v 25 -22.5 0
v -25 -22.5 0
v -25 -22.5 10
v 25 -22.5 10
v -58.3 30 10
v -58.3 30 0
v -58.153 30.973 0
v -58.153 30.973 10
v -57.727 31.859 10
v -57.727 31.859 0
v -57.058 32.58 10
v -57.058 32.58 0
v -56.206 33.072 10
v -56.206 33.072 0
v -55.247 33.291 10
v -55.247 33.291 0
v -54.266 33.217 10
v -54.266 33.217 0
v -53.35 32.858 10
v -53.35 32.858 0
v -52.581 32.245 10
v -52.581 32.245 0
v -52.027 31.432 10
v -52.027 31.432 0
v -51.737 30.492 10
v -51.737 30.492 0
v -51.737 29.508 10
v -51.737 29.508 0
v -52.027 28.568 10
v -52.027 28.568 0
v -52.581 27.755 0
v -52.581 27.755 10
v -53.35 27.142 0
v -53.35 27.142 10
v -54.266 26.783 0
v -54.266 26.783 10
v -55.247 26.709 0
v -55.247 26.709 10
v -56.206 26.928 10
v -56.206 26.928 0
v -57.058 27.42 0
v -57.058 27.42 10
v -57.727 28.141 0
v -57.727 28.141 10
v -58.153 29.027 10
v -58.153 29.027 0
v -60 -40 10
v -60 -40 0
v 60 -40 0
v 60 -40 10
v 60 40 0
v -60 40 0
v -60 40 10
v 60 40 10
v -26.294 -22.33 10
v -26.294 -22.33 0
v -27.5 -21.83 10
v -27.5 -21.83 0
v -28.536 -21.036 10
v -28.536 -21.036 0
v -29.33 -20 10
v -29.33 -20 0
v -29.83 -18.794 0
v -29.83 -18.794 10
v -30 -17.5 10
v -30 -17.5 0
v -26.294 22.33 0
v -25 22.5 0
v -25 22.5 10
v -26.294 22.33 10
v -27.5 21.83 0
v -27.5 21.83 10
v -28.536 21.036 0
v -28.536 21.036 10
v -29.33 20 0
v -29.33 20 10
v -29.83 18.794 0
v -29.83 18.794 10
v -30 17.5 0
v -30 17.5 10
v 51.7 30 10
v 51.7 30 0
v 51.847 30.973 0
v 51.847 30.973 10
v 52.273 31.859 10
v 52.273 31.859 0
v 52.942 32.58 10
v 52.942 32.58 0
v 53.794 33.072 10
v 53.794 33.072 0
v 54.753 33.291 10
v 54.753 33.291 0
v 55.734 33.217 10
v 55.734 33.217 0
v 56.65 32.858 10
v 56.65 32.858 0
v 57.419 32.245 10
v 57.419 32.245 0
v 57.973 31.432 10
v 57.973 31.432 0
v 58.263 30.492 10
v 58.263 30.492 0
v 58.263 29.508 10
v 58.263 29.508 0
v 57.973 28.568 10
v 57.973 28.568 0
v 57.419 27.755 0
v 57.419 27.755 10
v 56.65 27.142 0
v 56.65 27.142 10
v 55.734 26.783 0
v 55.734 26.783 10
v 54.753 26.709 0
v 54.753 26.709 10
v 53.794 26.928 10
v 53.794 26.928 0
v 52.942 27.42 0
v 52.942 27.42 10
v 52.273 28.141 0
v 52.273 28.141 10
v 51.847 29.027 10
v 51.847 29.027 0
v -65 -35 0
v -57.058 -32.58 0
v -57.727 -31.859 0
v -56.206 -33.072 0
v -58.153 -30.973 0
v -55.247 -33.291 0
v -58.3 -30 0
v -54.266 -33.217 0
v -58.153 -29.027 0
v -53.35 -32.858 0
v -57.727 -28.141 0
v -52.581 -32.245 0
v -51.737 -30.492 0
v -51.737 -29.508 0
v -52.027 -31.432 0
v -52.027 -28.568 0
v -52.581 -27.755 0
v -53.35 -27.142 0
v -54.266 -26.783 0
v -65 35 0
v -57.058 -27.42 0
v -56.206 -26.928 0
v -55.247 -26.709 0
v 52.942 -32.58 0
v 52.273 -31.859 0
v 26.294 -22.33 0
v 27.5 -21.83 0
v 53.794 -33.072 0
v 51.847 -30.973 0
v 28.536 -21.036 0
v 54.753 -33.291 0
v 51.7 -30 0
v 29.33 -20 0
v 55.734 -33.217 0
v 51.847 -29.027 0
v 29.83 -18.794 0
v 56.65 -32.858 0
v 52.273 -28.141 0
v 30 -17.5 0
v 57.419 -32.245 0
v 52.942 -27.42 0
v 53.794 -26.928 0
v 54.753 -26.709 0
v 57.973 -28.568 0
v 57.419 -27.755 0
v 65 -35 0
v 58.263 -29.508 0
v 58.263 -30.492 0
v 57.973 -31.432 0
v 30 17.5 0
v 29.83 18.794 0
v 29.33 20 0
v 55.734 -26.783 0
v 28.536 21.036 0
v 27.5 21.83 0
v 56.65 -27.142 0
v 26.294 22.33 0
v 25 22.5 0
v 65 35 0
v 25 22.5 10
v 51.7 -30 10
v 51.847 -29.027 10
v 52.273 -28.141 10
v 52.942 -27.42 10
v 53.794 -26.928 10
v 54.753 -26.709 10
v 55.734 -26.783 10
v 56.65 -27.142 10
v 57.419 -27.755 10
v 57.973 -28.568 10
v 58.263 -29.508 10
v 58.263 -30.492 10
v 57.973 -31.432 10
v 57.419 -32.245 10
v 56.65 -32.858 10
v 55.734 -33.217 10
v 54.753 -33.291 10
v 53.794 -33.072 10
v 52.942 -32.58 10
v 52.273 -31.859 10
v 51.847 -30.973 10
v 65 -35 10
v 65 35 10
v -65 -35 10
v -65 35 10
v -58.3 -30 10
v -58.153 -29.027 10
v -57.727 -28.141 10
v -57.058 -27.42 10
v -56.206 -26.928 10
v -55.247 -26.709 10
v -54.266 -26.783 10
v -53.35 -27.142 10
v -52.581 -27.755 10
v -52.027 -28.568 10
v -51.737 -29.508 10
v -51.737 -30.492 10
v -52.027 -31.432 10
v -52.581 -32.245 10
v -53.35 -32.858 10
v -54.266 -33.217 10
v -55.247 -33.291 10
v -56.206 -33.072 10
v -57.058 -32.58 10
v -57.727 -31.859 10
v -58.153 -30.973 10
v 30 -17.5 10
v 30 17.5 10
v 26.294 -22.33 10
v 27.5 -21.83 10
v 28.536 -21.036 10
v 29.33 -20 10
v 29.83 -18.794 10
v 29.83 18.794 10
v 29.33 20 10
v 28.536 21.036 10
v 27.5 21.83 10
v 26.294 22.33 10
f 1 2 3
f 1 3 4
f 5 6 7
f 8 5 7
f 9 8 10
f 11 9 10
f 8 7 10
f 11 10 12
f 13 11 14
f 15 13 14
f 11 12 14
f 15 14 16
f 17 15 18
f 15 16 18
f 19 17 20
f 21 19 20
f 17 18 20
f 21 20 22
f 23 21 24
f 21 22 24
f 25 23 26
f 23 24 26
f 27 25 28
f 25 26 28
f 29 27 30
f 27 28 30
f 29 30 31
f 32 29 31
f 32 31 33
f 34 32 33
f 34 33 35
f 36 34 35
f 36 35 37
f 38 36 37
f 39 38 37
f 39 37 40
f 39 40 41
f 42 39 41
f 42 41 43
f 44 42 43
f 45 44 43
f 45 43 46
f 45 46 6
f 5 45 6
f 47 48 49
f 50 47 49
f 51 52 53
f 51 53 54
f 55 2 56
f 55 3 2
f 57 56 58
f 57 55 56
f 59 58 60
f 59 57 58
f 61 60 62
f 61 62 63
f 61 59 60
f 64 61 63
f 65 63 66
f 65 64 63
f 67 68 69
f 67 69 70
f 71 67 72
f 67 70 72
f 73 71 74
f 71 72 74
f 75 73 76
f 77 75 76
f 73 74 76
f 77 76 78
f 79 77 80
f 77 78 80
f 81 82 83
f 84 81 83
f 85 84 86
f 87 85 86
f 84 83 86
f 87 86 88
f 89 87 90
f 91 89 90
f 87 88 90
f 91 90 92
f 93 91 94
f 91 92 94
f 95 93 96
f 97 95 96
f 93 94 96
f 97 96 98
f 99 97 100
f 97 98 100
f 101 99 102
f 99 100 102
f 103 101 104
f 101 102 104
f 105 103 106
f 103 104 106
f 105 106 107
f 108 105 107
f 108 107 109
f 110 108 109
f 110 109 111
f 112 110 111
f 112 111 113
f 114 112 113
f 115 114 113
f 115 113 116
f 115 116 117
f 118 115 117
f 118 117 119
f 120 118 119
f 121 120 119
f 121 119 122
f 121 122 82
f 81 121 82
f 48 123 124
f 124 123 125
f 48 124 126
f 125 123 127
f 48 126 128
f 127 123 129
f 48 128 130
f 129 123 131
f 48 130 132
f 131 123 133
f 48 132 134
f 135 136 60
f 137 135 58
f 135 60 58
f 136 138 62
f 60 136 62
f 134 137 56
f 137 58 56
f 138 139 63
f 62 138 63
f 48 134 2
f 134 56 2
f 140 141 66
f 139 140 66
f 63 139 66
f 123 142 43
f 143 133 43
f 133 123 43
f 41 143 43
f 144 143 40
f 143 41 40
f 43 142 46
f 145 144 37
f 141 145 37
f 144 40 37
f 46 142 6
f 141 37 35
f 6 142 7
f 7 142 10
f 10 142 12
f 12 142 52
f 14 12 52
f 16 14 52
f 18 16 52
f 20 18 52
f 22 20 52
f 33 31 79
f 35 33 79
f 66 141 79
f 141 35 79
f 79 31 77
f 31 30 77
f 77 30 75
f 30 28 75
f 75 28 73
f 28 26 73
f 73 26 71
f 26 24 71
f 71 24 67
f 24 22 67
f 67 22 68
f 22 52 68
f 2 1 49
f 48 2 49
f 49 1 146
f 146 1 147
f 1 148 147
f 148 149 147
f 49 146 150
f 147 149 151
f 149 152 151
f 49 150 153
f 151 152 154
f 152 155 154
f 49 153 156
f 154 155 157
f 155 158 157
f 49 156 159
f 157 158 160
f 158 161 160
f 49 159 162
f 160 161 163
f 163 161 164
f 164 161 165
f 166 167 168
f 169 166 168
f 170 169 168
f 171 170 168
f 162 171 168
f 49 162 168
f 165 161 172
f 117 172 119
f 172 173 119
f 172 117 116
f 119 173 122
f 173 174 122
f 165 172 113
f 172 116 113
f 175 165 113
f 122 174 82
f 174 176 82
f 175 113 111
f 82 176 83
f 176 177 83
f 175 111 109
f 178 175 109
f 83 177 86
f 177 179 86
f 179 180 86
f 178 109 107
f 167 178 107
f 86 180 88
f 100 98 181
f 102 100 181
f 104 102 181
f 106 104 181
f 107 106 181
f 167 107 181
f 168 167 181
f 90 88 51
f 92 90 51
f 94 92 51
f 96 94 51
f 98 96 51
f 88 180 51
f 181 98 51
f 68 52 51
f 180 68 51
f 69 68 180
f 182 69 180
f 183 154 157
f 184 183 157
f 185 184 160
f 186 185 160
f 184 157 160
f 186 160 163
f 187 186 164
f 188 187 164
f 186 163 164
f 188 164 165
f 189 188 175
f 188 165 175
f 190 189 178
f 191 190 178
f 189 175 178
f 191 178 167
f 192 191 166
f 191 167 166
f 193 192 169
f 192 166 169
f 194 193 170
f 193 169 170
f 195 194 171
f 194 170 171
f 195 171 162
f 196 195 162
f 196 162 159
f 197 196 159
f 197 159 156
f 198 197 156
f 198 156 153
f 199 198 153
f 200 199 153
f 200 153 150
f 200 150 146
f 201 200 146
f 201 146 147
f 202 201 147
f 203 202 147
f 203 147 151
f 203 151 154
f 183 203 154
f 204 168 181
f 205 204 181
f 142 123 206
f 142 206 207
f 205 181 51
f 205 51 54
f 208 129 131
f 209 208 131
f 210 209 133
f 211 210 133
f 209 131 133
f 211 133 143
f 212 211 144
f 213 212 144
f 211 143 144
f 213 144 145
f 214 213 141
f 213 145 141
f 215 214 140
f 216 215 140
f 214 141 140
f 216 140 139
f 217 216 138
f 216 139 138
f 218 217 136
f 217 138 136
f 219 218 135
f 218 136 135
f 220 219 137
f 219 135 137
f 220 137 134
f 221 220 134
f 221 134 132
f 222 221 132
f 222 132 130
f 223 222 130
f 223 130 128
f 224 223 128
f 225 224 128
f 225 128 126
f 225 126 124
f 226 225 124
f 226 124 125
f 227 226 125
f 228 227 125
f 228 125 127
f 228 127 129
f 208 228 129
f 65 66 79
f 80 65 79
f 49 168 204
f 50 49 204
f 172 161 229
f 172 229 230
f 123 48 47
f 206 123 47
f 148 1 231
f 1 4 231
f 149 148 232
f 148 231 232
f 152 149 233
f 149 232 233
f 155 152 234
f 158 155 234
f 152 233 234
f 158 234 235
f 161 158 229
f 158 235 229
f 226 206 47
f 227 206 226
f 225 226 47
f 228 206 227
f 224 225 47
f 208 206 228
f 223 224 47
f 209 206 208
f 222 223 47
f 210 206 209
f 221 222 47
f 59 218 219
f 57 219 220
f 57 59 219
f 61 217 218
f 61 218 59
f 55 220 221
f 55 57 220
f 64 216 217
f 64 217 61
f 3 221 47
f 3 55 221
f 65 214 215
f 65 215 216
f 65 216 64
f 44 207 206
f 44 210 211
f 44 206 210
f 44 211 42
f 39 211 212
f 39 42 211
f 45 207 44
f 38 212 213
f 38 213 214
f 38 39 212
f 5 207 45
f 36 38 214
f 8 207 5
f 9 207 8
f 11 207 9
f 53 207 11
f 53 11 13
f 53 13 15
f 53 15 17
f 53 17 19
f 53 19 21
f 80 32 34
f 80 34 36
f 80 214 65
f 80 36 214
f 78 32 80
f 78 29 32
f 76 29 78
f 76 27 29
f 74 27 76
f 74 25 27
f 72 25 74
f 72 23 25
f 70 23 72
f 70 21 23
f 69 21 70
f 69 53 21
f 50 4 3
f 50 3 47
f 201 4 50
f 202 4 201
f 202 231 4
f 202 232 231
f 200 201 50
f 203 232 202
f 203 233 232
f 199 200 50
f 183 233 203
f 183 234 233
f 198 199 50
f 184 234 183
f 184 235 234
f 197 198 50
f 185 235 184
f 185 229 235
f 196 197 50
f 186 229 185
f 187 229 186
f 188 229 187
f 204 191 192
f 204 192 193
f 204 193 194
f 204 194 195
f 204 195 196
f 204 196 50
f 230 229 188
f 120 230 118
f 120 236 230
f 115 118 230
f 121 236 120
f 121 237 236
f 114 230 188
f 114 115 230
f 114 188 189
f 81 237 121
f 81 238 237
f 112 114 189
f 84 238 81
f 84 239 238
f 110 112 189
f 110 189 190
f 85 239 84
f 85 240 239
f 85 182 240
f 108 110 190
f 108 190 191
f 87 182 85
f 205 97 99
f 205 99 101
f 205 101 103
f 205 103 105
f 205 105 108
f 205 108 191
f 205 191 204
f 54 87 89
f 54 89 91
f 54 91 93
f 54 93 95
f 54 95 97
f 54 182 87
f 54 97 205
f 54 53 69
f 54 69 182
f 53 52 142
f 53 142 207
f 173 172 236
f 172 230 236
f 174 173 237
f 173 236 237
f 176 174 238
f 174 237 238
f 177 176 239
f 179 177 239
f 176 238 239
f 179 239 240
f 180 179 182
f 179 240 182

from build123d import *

# Parameters (mm, degrees)
F0_W     = 130
F0_H     = 80
F0_W_2   = 60
F0_H_2   = 45
F1_DEPTH = 10
F3_R     = 5
F4_SIZE  = 5
F5_D     = 6.6
F5_DEPTH = 20
F5_TIP   = 1.9828400428


with BuildPart() as f1:
    # F0 (on Top) → F1 (new body)
    with BuildSketch(Plane.XY):
        Rectangle(F0_W, F0_H)
        Rectangle(F0_W_2, F0_H_2, mode=Mode.SUBTRACT)
    extrude(amount=F1_DEPTH)

    # F3
    f3_edges = [f1.edges().sort_by_distance(p)[0] for p in [
        (-30, 22.5, 5),
        (-30, -22.5, 5),
        (30, -22.5, 5),
        (30, 22.5, 5),
    ]]
    fillet(f3_edges, radius=F3_R)

    # F4
    f4_edges = [f1.edges().sort_by_distance(p)[0] for p in [
        (-65, -40, 5),
        (-65, 40, 5),
        (65, -40, 5),
        (65, 40, 5),
    ]]
    chamfer(f4_edges, length=F4_SIZE)

    # F5
    with Locations(Plane.XY.offset(10)):
        with Locations((-55, 30), (-55, -30), (55, -30), (55, 30)):
            Hole(F5_D / 2, depth=F5_DEPTH)
            with Locations((0, 0, -(F5_DEPTH + F5_TIP / 2))):  # 118° drill point
                Cone(0, F5_D / 2, F5_TIP, mode=Mode.SUBTRACT)


solid = f1.part
